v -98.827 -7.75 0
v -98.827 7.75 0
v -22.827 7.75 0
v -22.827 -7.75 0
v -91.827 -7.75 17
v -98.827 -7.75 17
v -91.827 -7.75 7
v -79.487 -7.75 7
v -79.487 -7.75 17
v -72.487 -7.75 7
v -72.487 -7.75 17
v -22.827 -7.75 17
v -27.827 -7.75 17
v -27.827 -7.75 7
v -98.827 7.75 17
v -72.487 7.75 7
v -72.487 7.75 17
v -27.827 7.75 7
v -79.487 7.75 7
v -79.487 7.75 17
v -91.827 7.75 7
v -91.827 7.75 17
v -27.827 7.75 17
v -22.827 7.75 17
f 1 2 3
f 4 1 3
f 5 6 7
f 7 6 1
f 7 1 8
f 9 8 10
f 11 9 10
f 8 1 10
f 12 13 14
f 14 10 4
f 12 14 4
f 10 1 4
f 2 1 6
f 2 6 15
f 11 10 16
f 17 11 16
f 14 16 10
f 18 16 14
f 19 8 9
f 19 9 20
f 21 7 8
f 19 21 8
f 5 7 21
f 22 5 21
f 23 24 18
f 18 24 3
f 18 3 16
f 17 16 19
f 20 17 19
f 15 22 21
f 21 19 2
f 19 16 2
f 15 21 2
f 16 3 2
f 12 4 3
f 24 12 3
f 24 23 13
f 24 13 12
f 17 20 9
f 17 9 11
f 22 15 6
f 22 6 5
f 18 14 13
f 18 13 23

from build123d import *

# Parameters (mm, degrees)
F0_W     = 7
F0_H     = 15.5
F0_W_2   = 12.34
F0_W_3   = 44.66
F0_W_4   = 5
F1_DEPTH = 7
F2_DEPTH = 17


with BuildPart() as f1:
    # F0 (on Top) → F1 (new body)
    with BuildSketch(Plane.XY):
        with Locations((-95.327207, 0)):
            Rectangle(F0_W, F0_H)
        with Locations((-85.657207, 0)):
            Rectangle(F0_W_2, F0_H)
        with Locations((-75.987207, 0)):
            Rectangle(F0_W, F0_H)
        with Locations((-50.157207, 0)):
            Rectangle(F0_W_3, F0_H)
        with Locations((-25.327207, 0)):
            Rectangle(F0_W_4, F0_H)
    extrude(amount=F1_DEPTH)

    # F0 (on Top) → F2 (join)
    with BuildSketch(Plane.XY):
        with Locations((-95.327207, 0)):
            Rectangle(F0_W, F0_H)
        with Locations((-75.987207, 0)):
            Rectangle(F0_W, F0_H)
        with Locations((-25.327207, 0)):
            Rectangle(F0_W_4, F0_H)
    extrude(amount=F2_DEPTH)


solid = f1.part
